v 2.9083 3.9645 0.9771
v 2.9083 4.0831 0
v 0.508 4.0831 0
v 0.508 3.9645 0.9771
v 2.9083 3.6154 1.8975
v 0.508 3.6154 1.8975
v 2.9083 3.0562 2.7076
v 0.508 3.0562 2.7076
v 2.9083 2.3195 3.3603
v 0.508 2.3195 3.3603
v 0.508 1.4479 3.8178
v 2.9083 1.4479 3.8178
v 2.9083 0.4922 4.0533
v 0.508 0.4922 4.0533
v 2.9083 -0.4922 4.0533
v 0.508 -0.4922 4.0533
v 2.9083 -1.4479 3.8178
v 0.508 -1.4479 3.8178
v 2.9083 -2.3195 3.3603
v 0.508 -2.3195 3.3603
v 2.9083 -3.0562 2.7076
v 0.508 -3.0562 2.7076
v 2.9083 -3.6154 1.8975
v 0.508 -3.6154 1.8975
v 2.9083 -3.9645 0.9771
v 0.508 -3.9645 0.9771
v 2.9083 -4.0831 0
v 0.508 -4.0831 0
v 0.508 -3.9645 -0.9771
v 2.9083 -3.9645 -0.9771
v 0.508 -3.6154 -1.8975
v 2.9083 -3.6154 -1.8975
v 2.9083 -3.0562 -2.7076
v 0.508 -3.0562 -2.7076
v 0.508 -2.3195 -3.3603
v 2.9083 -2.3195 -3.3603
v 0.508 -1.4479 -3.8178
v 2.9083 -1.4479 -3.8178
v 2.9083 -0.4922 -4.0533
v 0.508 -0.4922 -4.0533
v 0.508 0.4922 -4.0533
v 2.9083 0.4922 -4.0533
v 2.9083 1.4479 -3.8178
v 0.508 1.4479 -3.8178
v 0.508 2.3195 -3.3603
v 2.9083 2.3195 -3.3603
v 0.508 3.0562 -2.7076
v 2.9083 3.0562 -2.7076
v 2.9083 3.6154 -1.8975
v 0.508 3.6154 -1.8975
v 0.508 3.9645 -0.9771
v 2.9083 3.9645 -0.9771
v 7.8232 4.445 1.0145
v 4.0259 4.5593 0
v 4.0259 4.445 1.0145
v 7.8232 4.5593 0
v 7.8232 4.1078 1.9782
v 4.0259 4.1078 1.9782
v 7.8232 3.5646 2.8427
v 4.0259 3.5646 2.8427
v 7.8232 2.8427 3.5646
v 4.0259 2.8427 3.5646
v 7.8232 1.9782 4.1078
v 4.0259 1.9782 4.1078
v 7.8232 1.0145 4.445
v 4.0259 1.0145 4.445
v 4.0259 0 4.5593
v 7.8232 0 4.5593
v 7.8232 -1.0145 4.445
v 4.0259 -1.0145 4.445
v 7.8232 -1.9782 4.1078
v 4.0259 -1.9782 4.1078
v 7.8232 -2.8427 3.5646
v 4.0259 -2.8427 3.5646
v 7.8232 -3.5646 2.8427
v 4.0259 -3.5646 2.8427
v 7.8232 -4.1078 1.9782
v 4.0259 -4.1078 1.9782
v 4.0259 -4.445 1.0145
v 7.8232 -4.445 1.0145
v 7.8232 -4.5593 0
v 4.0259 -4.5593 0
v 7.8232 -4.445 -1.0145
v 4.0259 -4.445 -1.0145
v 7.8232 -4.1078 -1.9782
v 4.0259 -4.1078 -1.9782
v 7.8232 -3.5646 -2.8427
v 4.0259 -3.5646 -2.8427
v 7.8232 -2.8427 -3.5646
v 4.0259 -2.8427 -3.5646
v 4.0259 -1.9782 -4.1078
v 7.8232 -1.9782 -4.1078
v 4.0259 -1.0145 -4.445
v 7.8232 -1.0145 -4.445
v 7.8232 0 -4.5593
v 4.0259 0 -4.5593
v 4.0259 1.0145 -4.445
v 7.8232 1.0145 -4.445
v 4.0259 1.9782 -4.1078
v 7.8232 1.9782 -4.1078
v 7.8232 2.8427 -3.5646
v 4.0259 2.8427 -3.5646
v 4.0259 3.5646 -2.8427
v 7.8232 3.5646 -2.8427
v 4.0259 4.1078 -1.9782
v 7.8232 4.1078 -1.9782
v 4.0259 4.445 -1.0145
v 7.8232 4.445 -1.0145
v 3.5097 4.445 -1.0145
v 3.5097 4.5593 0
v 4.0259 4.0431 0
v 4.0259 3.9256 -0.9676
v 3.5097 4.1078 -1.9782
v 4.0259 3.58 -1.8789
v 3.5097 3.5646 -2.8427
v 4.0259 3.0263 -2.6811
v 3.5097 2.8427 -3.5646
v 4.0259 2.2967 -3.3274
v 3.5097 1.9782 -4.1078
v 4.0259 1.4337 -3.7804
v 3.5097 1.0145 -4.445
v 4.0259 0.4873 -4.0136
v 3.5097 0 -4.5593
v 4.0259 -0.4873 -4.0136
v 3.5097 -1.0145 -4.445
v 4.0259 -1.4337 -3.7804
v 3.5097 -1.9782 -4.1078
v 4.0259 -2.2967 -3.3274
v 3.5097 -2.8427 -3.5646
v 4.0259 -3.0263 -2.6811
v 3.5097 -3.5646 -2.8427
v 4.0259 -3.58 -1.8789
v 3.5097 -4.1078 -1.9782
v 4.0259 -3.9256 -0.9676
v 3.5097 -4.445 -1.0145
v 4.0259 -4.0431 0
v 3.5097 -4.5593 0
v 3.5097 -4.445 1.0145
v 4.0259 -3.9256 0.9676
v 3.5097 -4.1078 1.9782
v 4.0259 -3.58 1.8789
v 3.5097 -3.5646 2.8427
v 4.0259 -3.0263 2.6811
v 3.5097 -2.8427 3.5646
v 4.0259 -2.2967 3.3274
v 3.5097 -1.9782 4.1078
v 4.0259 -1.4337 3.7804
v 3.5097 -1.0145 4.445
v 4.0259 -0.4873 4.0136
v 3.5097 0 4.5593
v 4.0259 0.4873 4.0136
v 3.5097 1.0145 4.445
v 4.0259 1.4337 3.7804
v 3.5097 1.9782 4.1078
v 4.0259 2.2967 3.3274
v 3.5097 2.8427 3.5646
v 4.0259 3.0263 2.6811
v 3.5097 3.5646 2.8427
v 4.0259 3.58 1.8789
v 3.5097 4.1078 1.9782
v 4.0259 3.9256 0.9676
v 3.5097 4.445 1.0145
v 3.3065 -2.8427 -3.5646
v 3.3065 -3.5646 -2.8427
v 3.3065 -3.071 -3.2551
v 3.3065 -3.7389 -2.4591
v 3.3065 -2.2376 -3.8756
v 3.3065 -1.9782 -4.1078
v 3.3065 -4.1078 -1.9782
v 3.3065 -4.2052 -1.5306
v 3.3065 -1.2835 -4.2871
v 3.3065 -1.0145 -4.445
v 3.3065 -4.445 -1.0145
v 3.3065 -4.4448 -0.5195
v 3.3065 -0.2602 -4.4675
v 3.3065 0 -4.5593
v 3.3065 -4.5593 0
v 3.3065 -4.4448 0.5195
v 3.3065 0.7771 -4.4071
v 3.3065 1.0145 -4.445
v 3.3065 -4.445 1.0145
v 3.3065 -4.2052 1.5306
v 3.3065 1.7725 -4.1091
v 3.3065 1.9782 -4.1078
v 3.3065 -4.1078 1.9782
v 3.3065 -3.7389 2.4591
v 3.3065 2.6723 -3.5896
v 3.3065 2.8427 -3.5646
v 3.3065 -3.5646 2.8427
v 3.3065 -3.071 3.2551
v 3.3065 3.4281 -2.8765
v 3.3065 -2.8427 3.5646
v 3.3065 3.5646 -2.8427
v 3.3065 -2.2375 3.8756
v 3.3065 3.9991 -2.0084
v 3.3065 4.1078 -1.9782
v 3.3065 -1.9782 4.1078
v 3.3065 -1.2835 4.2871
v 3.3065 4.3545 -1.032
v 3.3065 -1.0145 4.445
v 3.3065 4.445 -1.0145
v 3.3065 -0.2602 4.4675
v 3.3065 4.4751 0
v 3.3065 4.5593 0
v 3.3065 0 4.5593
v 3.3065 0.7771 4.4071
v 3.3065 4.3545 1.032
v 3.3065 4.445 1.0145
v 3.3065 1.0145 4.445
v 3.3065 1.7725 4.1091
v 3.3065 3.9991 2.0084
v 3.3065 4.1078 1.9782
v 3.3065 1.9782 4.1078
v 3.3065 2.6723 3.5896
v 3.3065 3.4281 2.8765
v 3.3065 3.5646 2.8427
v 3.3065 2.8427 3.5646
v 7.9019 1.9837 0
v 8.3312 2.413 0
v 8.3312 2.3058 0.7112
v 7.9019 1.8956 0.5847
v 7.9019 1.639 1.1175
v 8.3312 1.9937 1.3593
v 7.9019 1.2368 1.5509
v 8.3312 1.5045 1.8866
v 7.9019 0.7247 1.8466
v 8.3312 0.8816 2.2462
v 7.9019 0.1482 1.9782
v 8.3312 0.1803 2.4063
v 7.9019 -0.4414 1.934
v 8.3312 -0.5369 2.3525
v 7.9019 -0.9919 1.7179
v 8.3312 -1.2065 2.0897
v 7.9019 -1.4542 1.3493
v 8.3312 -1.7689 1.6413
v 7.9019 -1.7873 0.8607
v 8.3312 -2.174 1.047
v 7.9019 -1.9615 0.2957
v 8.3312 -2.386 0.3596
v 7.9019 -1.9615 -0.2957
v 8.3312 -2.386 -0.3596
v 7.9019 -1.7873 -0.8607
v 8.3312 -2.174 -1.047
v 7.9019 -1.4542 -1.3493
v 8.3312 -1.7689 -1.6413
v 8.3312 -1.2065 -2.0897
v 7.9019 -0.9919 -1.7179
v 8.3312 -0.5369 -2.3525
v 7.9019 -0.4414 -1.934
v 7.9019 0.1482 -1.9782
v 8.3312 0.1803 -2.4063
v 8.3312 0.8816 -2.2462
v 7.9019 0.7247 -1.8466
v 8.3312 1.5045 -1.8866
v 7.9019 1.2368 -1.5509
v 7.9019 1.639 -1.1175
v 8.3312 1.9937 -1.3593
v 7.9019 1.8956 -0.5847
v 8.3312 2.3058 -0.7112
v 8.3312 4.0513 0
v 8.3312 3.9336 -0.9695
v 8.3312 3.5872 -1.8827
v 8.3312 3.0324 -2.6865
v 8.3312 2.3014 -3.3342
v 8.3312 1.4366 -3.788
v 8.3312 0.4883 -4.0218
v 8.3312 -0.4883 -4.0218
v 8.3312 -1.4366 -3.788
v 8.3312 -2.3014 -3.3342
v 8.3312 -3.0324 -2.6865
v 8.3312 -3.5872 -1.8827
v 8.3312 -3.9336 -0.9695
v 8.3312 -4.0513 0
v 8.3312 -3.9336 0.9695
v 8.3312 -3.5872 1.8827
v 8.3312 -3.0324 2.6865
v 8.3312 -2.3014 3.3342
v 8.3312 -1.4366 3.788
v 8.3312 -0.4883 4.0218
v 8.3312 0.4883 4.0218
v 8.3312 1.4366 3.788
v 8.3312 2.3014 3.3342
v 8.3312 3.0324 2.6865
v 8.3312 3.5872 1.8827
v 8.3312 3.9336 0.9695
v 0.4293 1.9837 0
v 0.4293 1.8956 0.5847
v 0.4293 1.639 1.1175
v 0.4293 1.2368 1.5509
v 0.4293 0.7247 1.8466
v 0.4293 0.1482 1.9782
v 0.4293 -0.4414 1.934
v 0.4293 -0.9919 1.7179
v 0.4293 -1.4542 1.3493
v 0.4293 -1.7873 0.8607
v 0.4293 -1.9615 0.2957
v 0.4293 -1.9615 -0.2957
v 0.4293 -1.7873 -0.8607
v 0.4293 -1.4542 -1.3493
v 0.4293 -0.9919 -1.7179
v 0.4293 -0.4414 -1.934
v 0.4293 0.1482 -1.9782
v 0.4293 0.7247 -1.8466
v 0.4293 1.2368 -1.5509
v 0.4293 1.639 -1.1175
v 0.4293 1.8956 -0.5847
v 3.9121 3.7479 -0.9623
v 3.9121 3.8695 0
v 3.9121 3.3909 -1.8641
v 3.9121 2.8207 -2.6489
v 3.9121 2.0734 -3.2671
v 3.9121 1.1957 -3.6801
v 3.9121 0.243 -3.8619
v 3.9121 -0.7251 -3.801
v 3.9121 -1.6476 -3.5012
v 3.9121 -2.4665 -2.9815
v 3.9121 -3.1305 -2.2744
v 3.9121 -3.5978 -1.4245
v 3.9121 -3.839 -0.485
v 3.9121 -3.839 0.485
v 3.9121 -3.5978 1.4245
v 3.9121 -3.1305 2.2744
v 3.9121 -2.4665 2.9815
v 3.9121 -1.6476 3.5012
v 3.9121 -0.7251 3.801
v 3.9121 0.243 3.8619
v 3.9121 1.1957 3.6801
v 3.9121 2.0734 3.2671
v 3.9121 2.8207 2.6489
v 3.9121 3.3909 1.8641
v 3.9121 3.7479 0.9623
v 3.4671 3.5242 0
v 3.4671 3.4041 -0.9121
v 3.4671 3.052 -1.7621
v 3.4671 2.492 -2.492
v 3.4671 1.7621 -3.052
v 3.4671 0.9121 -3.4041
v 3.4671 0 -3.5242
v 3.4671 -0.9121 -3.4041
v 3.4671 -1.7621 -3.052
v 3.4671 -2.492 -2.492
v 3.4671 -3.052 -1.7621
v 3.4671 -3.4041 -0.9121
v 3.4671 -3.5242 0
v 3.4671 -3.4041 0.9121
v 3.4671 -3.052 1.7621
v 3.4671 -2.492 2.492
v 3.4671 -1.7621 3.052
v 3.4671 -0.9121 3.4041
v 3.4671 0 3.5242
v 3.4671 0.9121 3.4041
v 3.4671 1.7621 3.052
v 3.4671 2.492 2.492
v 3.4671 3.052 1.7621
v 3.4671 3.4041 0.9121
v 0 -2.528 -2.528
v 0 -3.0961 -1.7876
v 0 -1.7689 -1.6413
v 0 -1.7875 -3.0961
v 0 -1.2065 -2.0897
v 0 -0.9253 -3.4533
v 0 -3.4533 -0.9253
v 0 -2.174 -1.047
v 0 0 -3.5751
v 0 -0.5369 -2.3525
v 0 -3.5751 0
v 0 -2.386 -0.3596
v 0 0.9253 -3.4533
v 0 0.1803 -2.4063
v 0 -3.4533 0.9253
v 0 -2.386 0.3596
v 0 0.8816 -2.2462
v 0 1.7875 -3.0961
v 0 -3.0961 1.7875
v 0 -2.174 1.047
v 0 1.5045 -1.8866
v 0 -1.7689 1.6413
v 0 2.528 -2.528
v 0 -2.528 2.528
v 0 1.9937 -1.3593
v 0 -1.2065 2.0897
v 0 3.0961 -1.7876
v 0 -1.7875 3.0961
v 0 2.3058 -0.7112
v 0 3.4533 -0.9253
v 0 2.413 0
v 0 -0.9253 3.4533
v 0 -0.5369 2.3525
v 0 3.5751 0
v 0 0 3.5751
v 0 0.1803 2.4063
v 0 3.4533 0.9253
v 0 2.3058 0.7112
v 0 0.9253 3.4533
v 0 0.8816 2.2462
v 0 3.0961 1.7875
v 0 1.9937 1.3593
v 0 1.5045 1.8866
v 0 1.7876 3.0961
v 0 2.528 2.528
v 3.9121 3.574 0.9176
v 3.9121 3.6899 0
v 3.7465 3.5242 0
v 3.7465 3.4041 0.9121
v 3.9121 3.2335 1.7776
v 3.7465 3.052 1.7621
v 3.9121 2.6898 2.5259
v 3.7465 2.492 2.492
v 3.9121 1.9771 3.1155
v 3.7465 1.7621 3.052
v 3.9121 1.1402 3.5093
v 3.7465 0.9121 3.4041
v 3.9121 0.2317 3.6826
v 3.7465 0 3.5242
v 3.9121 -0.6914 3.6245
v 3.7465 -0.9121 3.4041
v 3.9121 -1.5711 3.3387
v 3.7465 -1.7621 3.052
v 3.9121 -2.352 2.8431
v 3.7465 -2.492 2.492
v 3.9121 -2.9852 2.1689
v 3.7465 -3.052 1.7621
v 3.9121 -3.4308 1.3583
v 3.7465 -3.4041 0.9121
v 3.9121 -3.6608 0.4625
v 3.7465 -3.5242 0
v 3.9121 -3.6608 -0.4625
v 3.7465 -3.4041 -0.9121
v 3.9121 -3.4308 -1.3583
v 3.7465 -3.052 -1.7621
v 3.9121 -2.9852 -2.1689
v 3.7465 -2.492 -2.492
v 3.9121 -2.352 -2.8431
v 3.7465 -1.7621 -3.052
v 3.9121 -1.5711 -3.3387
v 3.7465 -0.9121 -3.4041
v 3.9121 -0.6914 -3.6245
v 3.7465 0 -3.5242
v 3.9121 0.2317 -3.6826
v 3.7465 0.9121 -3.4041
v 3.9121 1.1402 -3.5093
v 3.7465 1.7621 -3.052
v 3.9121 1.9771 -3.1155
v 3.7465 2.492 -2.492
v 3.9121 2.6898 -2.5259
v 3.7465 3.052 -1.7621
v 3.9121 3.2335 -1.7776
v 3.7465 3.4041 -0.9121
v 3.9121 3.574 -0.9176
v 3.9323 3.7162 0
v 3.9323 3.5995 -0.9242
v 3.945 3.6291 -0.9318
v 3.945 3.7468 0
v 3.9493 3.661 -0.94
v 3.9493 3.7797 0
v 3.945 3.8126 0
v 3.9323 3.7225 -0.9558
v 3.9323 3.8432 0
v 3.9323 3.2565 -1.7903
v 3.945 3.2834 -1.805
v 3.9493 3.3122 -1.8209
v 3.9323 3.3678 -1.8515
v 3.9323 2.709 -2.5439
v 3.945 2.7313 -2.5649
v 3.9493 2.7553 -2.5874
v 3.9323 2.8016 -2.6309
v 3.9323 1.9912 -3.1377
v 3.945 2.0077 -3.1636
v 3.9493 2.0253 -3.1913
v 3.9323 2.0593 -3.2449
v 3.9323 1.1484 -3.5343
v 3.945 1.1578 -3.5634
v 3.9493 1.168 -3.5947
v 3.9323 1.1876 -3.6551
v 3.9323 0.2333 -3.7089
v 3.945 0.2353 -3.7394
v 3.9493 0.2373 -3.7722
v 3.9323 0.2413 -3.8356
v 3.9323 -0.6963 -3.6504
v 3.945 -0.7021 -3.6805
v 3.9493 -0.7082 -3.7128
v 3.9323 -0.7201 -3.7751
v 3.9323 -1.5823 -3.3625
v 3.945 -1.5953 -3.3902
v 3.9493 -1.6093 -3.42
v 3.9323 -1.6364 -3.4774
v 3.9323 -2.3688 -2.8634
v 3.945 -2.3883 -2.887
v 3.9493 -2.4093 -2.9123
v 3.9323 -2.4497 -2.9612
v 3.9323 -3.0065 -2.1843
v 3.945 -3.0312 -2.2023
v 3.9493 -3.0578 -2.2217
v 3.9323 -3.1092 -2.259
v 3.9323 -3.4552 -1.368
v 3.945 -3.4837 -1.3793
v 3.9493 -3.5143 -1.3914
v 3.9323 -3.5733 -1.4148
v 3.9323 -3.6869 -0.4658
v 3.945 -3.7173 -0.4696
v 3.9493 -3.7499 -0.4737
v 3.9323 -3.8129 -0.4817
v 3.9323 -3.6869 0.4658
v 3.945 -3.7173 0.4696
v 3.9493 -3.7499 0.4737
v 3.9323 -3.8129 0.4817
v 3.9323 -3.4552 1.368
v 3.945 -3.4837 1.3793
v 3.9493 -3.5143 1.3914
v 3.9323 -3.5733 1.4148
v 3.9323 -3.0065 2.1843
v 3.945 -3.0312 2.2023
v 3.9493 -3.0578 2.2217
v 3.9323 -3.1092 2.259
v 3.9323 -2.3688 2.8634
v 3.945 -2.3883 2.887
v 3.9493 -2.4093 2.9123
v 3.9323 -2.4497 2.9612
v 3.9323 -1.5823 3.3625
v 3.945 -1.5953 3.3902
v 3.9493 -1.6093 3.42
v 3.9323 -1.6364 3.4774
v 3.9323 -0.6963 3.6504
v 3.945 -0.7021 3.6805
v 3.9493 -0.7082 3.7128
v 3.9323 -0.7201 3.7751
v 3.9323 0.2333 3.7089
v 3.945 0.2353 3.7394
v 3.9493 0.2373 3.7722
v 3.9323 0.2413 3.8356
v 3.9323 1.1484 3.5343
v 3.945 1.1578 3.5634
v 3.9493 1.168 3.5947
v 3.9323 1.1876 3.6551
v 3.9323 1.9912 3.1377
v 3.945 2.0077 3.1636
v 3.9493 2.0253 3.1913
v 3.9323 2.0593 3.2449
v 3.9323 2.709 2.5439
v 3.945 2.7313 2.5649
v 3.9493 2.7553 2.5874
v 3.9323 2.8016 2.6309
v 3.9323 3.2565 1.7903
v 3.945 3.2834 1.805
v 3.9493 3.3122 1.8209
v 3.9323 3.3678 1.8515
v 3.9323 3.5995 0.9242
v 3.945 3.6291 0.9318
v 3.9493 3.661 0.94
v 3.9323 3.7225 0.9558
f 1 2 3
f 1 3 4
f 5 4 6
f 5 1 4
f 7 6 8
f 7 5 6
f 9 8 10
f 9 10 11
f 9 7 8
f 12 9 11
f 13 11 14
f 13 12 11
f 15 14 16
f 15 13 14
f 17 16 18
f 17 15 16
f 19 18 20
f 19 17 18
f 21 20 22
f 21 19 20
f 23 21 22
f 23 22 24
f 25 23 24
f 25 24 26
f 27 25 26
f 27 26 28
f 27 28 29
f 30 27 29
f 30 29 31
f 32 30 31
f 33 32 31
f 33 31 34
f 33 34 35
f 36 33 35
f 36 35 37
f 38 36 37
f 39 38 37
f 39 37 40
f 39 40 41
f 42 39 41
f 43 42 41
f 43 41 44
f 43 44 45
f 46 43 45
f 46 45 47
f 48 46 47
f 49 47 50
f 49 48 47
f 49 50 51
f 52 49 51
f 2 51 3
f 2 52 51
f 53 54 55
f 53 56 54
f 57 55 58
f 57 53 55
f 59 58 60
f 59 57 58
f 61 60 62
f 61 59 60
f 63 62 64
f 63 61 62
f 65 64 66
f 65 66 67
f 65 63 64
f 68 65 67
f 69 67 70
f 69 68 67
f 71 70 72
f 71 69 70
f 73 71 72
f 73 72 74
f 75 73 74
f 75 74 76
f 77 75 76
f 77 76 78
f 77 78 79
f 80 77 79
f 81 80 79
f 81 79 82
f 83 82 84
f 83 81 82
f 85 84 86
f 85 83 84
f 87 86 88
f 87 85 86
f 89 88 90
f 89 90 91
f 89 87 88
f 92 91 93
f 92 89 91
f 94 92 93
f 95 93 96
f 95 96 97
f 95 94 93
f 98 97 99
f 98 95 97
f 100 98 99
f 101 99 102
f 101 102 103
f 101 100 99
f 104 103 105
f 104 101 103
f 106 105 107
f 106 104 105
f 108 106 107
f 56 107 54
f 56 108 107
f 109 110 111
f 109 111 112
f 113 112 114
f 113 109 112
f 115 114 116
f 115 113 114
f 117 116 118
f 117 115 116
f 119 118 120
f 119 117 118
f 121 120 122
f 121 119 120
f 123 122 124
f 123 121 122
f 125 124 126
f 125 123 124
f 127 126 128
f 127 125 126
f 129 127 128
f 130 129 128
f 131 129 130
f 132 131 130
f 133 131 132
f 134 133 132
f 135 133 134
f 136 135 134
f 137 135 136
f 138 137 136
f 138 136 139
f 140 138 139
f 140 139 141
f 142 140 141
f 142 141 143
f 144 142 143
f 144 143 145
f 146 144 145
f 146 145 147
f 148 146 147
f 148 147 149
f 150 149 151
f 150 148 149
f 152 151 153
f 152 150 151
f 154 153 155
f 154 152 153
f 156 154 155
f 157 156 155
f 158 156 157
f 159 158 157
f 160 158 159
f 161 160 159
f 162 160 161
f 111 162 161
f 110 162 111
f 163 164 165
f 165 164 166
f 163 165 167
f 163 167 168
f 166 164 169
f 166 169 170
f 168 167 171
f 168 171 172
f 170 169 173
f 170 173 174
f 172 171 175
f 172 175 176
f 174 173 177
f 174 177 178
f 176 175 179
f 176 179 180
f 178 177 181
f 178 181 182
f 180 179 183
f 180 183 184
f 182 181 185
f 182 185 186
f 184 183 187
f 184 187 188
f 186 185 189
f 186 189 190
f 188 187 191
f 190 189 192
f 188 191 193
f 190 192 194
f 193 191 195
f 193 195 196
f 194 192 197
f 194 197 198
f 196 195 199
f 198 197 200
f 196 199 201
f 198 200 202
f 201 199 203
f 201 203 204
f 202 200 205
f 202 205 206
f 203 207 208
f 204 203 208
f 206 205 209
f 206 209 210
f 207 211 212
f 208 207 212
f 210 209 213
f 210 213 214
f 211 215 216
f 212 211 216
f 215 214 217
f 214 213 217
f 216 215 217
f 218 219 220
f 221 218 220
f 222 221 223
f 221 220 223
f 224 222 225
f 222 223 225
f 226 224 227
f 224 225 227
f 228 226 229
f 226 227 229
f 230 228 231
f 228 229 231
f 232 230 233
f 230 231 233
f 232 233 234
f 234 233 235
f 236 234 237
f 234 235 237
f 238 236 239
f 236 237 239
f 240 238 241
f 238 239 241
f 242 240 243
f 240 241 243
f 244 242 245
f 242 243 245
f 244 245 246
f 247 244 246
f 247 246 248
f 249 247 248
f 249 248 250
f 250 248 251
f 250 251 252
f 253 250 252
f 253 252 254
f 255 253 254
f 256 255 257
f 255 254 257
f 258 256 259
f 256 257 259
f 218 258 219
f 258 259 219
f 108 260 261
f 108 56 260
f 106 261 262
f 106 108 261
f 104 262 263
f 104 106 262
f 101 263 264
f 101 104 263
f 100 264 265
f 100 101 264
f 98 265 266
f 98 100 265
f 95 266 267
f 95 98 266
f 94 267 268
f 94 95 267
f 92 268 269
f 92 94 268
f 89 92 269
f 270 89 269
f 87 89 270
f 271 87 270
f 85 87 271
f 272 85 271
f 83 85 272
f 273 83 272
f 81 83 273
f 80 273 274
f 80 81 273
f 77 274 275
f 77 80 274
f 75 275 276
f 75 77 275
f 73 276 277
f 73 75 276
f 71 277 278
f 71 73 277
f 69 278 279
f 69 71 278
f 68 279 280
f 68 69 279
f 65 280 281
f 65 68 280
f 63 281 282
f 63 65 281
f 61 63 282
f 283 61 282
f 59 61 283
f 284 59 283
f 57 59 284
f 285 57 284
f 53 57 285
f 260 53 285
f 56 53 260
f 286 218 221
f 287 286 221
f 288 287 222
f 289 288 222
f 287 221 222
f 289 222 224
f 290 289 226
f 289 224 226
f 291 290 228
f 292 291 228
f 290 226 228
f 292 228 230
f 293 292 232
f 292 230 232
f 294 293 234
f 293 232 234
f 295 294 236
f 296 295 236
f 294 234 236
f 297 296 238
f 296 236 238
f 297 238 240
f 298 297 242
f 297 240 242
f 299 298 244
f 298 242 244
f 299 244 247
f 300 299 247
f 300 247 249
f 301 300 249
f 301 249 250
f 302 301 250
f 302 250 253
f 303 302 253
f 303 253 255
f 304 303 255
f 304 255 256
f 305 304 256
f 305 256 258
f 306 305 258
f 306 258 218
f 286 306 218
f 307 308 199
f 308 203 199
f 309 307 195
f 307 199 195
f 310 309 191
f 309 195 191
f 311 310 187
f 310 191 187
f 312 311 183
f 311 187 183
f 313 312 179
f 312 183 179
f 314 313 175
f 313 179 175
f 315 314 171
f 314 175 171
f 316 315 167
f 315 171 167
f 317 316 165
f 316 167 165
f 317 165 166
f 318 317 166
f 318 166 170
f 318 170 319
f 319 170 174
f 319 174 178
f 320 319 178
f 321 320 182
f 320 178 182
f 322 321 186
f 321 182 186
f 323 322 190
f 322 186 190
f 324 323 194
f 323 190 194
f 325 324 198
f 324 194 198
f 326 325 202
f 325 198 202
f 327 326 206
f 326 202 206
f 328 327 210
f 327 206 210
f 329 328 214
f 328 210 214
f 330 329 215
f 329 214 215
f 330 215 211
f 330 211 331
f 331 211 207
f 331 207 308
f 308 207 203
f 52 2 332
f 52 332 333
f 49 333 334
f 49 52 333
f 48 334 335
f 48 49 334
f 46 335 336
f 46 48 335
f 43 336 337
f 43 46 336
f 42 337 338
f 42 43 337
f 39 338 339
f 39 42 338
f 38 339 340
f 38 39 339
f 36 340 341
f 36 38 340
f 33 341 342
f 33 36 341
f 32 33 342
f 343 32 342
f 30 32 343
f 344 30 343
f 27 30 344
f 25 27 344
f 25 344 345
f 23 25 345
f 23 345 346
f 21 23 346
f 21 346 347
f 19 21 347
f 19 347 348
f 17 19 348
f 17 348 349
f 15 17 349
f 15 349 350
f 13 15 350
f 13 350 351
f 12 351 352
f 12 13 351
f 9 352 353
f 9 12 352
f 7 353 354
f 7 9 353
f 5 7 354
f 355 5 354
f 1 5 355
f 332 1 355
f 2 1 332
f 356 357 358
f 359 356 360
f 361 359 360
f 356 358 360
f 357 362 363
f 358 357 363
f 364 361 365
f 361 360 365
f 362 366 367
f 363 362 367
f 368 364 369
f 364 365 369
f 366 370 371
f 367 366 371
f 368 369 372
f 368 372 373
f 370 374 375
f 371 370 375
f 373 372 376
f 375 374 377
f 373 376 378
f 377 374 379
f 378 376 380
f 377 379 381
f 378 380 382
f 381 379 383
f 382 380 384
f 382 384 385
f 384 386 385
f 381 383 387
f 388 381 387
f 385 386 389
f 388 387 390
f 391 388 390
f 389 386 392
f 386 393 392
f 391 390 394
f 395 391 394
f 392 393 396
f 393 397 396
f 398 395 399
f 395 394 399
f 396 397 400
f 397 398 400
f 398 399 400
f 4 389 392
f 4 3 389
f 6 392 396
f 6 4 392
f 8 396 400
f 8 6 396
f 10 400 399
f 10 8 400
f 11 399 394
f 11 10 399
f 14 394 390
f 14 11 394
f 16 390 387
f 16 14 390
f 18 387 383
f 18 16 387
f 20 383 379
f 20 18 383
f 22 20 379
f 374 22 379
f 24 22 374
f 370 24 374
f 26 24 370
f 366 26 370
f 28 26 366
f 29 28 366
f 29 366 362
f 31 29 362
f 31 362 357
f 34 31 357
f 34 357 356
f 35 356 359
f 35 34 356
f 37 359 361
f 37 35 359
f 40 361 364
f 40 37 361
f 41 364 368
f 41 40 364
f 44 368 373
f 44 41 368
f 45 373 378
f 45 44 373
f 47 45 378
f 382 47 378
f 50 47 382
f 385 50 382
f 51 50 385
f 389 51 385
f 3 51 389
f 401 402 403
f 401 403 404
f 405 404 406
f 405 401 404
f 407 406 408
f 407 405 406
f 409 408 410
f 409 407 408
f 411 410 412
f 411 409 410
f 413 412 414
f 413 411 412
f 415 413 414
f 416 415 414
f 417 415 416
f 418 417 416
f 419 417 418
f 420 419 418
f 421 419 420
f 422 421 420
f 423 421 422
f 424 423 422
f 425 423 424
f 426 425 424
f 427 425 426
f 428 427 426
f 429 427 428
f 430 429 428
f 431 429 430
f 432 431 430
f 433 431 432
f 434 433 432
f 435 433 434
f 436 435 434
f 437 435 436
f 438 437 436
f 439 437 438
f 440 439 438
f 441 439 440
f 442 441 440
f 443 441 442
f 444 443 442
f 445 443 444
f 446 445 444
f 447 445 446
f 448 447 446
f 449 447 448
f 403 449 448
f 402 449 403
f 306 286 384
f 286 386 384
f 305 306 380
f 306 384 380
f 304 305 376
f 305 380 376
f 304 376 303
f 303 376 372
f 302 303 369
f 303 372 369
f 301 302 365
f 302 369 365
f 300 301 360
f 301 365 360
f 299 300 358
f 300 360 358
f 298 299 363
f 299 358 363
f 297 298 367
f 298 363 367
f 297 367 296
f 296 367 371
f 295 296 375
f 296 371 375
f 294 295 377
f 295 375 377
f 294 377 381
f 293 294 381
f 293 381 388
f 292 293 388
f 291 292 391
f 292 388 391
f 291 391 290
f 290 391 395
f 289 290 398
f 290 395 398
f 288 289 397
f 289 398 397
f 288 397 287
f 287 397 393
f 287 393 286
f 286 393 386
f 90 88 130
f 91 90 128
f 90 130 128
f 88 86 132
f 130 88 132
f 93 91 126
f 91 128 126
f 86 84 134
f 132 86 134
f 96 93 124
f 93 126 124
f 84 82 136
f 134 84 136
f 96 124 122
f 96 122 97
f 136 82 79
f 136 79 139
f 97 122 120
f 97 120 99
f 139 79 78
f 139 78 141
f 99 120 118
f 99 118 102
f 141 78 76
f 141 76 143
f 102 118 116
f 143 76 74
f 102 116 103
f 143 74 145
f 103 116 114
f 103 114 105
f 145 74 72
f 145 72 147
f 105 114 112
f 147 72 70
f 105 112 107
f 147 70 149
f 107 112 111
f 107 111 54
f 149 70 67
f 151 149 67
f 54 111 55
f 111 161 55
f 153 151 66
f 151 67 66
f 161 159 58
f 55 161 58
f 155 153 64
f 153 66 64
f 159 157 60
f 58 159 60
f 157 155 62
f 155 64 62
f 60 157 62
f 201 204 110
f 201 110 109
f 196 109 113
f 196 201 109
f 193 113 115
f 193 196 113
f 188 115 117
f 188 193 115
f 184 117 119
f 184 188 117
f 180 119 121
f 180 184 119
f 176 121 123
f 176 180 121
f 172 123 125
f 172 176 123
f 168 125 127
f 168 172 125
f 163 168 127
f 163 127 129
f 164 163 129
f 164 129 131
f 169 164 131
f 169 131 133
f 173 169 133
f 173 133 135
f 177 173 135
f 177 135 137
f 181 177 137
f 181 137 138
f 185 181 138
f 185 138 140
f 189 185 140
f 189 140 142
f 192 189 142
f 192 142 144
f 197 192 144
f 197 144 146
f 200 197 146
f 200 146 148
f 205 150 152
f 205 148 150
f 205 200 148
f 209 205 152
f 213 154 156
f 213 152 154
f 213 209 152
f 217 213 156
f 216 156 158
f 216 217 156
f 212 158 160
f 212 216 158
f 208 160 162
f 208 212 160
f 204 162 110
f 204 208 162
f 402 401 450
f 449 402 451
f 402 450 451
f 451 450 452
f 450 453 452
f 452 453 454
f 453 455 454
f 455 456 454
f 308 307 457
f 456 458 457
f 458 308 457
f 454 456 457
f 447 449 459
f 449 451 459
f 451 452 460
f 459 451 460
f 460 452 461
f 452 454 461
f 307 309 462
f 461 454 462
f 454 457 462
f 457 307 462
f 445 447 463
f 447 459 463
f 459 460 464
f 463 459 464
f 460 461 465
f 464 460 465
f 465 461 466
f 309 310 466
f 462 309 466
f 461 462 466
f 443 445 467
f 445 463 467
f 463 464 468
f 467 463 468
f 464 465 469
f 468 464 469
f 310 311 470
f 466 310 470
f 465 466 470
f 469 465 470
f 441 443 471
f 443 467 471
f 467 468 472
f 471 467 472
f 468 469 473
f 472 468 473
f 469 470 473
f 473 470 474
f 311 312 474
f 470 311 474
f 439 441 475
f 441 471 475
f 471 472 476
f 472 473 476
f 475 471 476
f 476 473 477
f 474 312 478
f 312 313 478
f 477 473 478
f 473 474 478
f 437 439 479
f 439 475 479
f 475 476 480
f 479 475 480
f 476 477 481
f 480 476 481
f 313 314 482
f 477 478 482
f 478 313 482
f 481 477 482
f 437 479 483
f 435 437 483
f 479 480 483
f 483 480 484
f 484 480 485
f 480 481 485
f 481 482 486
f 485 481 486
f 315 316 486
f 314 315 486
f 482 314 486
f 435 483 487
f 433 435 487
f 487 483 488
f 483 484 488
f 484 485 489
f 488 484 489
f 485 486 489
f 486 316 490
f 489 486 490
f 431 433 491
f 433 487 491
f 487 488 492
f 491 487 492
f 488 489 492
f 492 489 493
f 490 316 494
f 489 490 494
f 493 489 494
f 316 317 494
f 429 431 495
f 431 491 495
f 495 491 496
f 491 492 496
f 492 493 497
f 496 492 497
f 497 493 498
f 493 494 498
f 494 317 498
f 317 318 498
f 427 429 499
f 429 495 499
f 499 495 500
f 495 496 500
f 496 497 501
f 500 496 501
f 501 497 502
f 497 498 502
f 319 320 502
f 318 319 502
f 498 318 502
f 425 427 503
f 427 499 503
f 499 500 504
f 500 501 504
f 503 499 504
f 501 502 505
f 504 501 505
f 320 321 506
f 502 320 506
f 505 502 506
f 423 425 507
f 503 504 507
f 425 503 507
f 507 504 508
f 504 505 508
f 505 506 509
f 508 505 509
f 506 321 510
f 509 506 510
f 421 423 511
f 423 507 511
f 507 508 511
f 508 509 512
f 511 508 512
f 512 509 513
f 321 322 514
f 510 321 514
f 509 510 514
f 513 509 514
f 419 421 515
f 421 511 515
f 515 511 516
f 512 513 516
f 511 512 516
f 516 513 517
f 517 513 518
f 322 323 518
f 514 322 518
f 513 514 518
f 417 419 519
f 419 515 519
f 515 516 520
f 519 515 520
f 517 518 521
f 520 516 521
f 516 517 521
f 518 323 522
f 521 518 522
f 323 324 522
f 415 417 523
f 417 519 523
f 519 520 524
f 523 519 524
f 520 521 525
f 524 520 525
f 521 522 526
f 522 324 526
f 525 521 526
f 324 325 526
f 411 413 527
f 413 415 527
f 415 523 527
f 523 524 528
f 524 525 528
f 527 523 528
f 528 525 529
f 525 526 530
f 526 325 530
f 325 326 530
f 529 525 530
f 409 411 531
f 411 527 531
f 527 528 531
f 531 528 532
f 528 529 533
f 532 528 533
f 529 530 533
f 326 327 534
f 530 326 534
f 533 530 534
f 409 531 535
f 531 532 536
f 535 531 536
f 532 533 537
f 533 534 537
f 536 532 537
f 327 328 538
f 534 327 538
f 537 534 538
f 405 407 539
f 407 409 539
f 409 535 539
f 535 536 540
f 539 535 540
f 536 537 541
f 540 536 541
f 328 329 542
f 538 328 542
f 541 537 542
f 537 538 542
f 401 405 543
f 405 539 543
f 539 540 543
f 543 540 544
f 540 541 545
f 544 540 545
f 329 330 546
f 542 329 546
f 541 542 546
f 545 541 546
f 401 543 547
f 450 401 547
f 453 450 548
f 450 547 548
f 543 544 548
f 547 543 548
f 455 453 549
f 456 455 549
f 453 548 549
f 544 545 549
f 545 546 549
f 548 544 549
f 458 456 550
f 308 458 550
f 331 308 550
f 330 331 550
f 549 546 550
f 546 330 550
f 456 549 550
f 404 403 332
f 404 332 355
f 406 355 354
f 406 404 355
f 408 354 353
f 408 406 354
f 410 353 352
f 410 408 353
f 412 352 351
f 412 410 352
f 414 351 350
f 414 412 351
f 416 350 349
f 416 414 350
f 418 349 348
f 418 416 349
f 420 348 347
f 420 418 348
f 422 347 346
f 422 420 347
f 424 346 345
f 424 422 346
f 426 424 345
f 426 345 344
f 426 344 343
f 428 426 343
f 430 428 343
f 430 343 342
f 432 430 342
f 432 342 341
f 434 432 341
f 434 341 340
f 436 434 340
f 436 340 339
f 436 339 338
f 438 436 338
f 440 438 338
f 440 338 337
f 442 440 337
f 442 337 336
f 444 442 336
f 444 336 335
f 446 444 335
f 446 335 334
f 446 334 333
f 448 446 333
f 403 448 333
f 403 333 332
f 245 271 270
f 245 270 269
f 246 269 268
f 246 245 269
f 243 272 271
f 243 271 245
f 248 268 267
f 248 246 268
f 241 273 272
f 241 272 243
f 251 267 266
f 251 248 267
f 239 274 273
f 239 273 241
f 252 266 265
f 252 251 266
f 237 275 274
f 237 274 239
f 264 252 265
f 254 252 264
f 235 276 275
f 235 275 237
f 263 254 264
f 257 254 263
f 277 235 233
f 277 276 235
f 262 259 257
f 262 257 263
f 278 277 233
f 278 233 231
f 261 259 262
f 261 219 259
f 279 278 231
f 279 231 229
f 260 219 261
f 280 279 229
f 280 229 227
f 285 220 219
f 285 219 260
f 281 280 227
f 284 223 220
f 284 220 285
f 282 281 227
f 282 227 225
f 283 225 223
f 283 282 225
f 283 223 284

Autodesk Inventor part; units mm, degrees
sketch "Sketch_1" plane through (0, 0, 0) normal (0, 0, 1) x (1, 0, 0)
  line L0 (8.3312, 0) -> (0, 0)
  line L1 (0, 0) -> (0, 3.5751)
  line L2 (0, 3.5751) -> (0.508, 4.0831)
  line L3 (0.508, 4.0831) -> (2.9083, 4.0831)
  line L4 (2.9083, 4.0831) -> (3.4671, 3.5242)
  line L5 (3.4671, 3.5242) -> (4.0259, 3.5242)
  line L6 (4.0259, 3.5242) -> (4.0259, 4.5593)
  line L7 (4.0259, 4.5593) -> (7.8232, 4.5593)
  line L8 (7.8232, 4.5593) -> (8.3312, 4.0513)
  line L9 (8.3312, 4.0513) -> (8.3312, 0)
  line L10 (8.3312, 0) -> (0, 0)
revolve "Revolution1" add sketch "Sketch_1" angle 360 about axis through (8.3312, 0, 0) along (1, 0, 0)
sketch "Sketch_2" plane through (0, 0, 0) normal (0, 0, 1) x (1, 0, 0)
  line L0 (8.3312, 0) -> (0, 0)
  line L1 (0, 0) -> (0, 2.413)
  line L2 (0, 2.413) -> (0.4293, 1.9837)
  line L3 (0.4293, 1.9837) -> (7.9019, 1.9837)
  line L4 (7.9019, 1.9837) -> (8.3312, 2.413)
  line L5 (8.3312, 2.413) -> (8.3312, 0)
  line L6 (8.3312, 0) -> (0, 0)
revolve "Revolution2" cut sketch "Sketch_2" angle 360 about axis through (8.3312, 0, 0) along (1, 0, 0)
thread "Thread1" size "10-32 UNF" class "2B" standard "ANSI Unified Screw Threads" full length
sketch "Sketch_24" plane through (0, 0, 0) normal (0, 0, 1) x (1, 0, 0)
  line L0 (4.0259, 0) -> (3.4671, 0)
  line L1 (3.3065, 4.5593) -> (3.3065, 4.4751)
  line L2 (3.3065, 4.4751) -> (3.9121, 3.8695)
  arc A0 (3.9121, 3.6899) -> (3.9121, 3.8695) centre (3.8223, 3.7797) ccw
  line L3 (3.9121, 3.6899) -> (3.7465, 3.5242)
  line L4 (3.7465, 3.5242) -> (3.4671, 3.5242)
  line L5 (3.4671, 3.5242) -> (3.4671, 3.2702)
  line L6 (3.4671, 3.2702) -> (4.0259, 3.2702)
  line L7 (4.0259, 3.2702) -> (4.0259, 4.0431)
  line L8 (4.0259, 4.0431) -> (3.5097, 4.5593)
  line L9 (3.5097, 4.5593) -> (3.3065, 4.5593)
revolve "Revolution3" add sketch "Sketch_24" angle 360 about axis through (4.0259, 0, 0) along (1, 0, 0)
ref_plane "lovra_XY" through (8.3312, 0, 0) normal (1, 0, 0) x (0, 1, 0)
ref_plane "lovra_YZ" through (8.3312, 0, 0) normal (0, 1, 0) x (0, 0, 1)
ref_plane "lovra_ZX" through (8.3312, 0, 0) normal (0, 0, 1) x (1, 0, 0)
ref_plane "lovra1_XY" through (8.3312, 0, 0) normal (1, 0, 0) x (0, 0, -1)
ref_plane "lovra1_YZ" through (8.3312, 0, 0) normal (0, 0, -1) x (0, 1, 0)
ref_plane "lovra1_ZX" through (8.3312, 0, 0) normal (0, 1, 0) x (1, 0, 0)
ref_plane "lovra2_XY" through (8.3312, 0, 0) normal (1, 0, 0) x (0, 0, -1)
ref_plane "lovra2_YZ" through (8.3312, 0, 0) normal (0, 0, -1) x (0, 1, 0)
ref_plane "lovra2_ZX" through (8.3312, 0, 0) normal (0, 1, 0) x (1, 0, 0)
ref_plane "lovra21_XY" through (0, 0, 5.2705) normal (1, 0, 0) x (0, 0, -1)
ref_plane "lovra21_YZ" through (0, 0, 5.2705) normal (0, 0, -1) x (0, 1, 0)
ref_plane "lovra21_ZX" through (0, 0, 5.2705) normal (0, 1, 0) x (1, 0, 0)
ref_plane "lovra22_XY" through (0, 0, -5.2705) normal (1, 0, 0) x (0, 0, -1)
ref_plane "lovra22_YZ" through (0, 0, -5.2705) normal (0, 0, -1) x (0, 1, 0)
ref_plane "lovra22_ZX" through (0, 0, -5.2705) normal (0, 1, 0) x (1, 0, 0)
ref_plane "lovra3_XY" through (8.3312, 0, 0) normal (1, 0, 0) x (0, 0, -1)
ref_plane "lovra3_YZ" through (8.3312, 0, 0) normal (0, 0, -1) x (0, 1, 0)
ref_plane "lovra3_ZX" through (8.3312, 0, 0) normal (0, 1, 0) x (1, 0, 0)
ref_plane "olen_XY" through (8.3312, 0, 0) normal (1, 0, 0) x (0, 0, -1)
ref_plane "olen_YZ" through (8.3312, 0, 0) normal (0, 0, -1) x (0, 1, 0)
ref_plane "olen_ZX" through (8.3312, 0, 0) normal (0, 1, 0) x (1, 0, 0)
ref_plane "to_mounting_bracket_XY" through (13.5509, 0, 0) normal (1, 0, 0) x (0, 0, -1)
ref_plane "to_mounting_bracket_YZ" through (13.5509, 0, 0) normal (0, 0, -1) x (0, 1, 0)
ref_plane "to_mounting_bracket_ZX" through (13.5509, 0, 0) normal (0, 1, 0) x (1, 0, 0)
ref_plane "to_nut_XY" through (0, 0, 0) normal (1, 0, 0) x (0, 0, -1)
ref_plane "to_nut_YZ" through (0, 0, 0) normal (0, 0, -1) x (0, 1, 0)
ref_plane "to_nut_ZX" through (0, 0, 0) normal (0, 1, 0) x (1, 0, 0)
ref_plane "to_pin_XY" through (18.2626, 0, 0) normal (0, 0, 1) x (1, 0, 0)
ref_plane "to_pin_YZ" through (18.2626, 0, 0) normal (1, 0, 0) x (0, 1, 0)
ref_plane "to_pin_ZX" through (18.2626, 0, 0) normal (0, 1, 0) x (0, 0, 1)
ref_plane "to_screw_XY" through (9.525, 0, 0) normal (0, 1, 0) x (1, 0, 0)
ref_plane "to_screw_YZ" through (9.525, 0, 0) normal (1, 0, 0) x (0, 0, -1)
ref_plane "to_screw_ZX" through (9.525, 0, 0) normal (0, 0, -1) x (0, 1, 0)
ref_plane "to_tube_XY" through (3.4671, 0, 0) normal (1, 0, 0) x (0, 0, -1)
ref_plane "to_tube_YZ" through (3.4671, 0, 0) normal (0, 0, -1) x (0, 1, 0)
ref_plane "to_tube_ZX" through (3.4671, 0, 0) normal (0, 1, 0) x (1, 0, 0)
properties part number "0070000_rear_head"
